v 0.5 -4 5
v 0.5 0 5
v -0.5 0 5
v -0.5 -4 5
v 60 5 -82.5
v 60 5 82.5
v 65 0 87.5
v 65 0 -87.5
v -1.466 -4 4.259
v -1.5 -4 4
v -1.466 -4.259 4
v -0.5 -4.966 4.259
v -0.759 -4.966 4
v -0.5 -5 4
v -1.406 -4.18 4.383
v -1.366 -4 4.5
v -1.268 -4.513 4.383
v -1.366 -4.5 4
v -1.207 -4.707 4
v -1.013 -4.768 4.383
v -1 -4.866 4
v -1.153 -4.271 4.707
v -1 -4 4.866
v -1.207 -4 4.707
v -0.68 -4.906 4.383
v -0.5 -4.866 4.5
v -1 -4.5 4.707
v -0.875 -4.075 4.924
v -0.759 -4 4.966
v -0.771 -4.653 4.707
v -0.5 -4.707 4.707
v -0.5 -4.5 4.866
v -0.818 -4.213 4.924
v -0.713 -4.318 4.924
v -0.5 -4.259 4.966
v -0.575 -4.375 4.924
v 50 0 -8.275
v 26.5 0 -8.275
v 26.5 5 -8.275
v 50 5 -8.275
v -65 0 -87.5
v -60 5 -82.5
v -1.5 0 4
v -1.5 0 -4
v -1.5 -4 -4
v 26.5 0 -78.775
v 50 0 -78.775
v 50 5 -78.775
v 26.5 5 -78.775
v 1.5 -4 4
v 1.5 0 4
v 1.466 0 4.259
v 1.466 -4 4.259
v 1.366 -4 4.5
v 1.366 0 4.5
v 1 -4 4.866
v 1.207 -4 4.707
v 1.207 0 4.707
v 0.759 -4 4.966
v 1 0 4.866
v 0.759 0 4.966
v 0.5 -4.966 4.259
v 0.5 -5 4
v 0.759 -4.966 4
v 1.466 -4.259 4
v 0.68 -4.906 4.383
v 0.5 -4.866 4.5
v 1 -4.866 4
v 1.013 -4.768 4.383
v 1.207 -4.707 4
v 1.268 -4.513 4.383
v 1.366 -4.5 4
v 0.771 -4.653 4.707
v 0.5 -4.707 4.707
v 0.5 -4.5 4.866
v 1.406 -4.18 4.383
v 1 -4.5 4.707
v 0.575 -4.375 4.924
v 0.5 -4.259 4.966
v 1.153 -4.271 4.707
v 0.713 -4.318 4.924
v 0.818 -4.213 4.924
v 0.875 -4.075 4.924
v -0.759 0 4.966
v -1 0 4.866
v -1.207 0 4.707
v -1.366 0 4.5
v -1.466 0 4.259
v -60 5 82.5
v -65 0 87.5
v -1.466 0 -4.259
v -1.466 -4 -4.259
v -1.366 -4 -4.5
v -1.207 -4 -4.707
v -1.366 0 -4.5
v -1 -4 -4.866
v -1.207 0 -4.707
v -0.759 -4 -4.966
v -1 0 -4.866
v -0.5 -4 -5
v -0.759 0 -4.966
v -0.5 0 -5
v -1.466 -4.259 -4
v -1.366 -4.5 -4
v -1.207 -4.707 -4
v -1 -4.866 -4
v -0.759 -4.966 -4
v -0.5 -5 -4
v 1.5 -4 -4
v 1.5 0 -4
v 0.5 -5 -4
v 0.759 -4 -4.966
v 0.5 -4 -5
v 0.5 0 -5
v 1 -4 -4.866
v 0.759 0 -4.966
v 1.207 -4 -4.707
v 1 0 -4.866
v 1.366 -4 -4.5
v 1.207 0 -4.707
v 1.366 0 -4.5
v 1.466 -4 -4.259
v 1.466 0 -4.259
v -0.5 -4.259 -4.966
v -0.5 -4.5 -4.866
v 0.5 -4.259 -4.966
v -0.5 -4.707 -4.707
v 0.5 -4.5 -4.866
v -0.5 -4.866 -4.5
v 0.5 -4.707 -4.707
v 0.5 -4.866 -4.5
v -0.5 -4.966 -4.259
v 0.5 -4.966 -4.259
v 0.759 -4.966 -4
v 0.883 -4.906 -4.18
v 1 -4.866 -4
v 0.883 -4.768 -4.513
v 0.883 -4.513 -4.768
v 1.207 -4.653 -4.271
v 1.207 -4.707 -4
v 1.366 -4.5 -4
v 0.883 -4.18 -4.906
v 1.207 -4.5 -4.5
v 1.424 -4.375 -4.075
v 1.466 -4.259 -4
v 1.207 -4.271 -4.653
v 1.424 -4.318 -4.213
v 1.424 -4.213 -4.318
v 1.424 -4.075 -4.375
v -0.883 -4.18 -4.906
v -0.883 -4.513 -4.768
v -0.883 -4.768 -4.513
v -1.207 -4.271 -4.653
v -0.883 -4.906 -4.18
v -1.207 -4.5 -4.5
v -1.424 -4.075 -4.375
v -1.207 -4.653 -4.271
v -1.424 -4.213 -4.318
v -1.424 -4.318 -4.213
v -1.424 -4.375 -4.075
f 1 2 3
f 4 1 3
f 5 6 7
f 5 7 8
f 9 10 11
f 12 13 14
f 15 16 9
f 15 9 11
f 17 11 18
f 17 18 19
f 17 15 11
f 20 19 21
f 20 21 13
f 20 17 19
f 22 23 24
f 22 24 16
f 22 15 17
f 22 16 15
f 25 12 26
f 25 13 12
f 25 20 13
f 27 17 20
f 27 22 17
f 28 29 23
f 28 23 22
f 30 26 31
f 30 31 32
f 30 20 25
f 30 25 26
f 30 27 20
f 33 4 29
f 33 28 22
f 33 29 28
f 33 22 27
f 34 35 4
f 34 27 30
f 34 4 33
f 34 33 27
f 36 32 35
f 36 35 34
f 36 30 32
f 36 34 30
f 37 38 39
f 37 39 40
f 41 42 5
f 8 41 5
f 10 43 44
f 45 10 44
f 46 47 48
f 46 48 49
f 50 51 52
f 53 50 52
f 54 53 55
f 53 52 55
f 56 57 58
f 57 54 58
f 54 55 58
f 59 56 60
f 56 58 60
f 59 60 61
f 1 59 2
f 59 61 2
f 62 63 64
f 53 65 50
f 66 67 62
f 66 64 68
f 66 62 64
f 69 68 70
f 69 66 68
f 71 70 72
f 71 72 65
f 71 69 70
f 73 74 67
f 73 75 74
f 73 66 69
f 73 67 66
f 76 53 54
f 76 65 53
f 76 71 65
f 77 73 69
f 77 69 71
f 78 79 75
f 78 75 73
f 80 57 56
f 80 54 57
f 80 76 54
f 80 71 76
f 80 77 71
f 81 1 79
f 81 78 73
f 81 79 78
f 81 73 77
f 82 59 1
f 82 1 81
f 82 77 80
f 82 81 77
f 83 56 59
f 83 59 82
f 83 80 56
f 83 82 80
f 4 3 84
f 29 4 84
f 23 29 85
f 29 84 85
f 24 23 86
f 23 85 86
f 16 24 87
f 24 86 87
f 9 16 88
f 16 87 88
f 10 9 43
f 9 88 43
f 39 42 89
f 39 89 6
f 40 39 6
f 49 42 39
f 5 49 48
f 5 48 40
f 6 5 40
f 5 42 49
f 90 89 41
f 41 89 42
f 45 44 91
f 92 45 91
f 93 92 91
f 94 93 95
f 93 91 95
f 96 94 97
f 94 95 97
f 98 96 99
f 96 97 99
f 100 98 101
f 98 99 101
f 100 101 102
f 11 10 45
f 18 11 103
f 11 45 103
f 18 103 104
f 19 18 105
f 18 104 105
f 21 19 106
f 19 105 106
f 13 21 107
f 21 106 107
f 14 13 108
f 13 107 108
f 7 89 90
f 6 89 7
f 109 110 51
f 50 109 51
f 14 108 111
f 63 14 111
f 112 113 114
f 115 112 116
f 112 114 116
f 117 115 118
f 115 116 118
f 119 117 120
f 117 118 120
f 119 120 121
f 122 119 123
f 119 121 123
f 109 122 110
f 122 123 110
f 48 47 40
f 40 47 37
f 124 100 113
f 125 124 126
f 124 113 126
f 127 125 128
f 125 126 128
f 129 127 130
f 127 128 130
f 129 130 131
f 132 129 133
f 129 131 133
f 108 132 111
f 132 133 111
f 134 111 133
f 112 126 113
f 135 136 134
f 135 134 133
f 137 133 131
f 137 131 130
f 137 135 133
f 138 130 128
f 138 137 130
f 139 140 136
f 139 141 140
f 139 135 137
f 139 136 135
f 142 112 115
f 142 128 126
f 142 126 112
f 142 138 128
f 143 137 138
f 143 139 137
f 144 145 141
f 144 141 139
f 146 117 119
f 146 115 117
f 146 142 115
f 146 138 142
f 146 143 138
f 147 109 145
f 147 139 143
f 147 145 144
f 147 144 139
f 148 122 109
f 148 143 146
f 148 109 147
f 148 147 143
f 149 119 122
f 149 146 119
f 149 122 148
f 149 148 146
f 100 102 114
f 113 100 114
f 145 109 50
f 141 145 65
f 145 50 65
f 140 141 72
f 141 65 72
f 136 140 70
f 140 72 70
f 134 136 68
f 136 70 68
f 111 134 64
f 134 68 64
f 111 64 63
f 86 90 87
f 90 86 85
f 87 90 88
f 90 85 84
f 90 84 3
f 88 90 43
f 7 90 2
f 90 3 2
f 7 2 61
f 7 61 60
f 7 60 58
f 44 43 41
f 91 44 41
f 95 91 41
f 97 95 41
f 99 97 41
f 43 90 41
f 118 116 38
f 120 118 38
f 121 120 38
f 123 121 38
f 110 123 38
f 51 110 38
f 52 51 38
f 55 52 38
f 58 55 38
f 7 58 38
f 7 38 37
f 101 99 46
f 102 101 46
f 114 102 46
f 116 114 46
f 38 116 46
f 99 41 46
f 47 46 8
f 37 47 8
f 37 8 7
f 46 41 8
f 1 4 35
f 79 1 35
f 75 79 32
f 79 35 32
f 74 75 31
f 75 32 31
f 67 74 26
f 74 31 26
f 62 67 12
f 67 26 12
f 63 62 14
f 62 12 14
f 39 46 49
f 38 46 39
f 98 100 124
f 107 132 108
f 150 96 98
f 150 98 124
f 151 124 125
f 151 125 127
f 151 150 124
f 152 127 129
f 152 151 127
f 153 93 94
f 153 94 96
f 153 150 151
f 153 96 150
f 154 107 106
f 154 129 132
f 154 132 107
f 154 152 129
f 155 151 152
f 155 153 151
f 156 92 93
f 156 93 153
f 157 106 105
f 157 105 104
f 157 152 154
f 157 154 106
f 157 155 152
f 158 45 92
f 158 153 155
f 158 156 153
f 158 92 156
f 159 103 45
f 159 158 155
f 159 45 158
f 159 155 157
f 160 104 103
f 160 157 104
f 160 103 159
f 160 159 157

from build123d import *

# Parameters (mm, degrees)
SKETCH1_W           = 130
SKETCH1_H           = 175
BOSS_EXTRUDE1_DEPTH = 5
CHAMFER1_SIZE       = 5
SKETCH2_W           = 1.5
SKETCH2_H           = 5
BOSS_EXTRUDE2_DEPTH = 5
FILLET2_R           = 1
FILLET3_R           = 1
CUT_EXTRUDE1_DEPTH  = 5


# Some blends are built 0.0001 mm under size
with BuildPart() as part:
    # Sketch1 → Boss-Extrude1 (new body)
    with BuildSketch(Plane(origin=(0, 0, 0), x_dir=(1, 0, 0), z_dir=(0, 1, 0))):
        Rectangle(SKETCH1_W, SKETCH1_H)
    extrude(amount=BOSS_EXTRUDE1_DEPTH)

    # Chamfer1
    chamfer1_edges = [part.edges().sort_by_distance(p)[0] for p in [
        (65, 5, 0),
        (0, 5, -87.5),
        (-65, 5, 0),
        (0, 5, 87.5),
    ]]
    chamfer(chamfer1_edges, length=CHAMFER1_SIZE - 0.0001)  # a hair under: the kernel refuses the full size

    # Sketch2 → Boss-Extrude2 (add)
    with BuildSketch(Plane.XZ):
        Polygon((0, 5), (0, 0), (-1.5, 0), (-1.5, -5), (1.5, -5), (1.5, 5), align=None)
        with Locations((-0.75, 2.5)):
            Rectangle(SKETCH2_W, SKETCH2_H)
    extrude(amount=BOSS_EXTRUDE2_DEPTH)

    # Fillet2
    fillet2_edges = [part.edges().sort_by_distance(p)[0] for p in [
        (-1.5, -5, 0),
        (0, -5, -5),
        (0, -5, 5),
        (1.5, -5, 0),
    ]]
    fillet(fillet2_edges, radius=FILLET2_R)

    # Fillet3
    # the kernel refuses this fillet: 1 mm, written as the material it takes off along each edge
    with BuildSketch(Plane(origin=(-0.5, -4, -4), x_dir=(0, 0, -1), z_dir=(-1, 0, 0))) as fillet3_piece_1_section:
        Polygon((0, 0), (FILLET3_R, 0), (FILLET3_R, FILLET3_R), (0, FILLET3_R), align=None)
    fillet3_piece_1 = extrude(amount=FILLET3_R, mode=Mode.PRIVATE)
    fillet3_piece_1 = fillet3_piece_1 - Plane(origin=(-0.5, -4, -4), x_dir=(0, 0.7071067811865475, 0.7071067811865475), z_dir=(-1, 0, 0)) * Sphere(FILLET3_R, mode=Mode.PRIVATE)
    add(fillet3_piece_1, mode=Mode.SUBTRACT)
    with BuildSketch(Plane(origin=(-0.5, -4, 4), x_dir=(-1, 0, 0), z_dir=(0, 0, 1))) as fillet3_piece_2_section:
        Polygon((0, 0), (FILLET3_R, 0), (FILLET3_R, FILLET3_R), (0, FILLET3_R), align=None)
    fillet3_piece_2 = extrude(amount=FILLET3_R, mode=Mode.PRIVATE)
    fillet3_piece_2 = fillet3_piece_2 - Plane(origin=(-0.5, -4, 4), x_dir=(0.7071067811865475, 0.7071067811865475, 0), z_dir=(0, 0, 1)) * Sphere(FILLET3_R, mode=Mode.PRIVATE)
    add(fillet3_piece_2, mode=Mode.SUBTRACT)
    with BuildSketch(Plane(origin=(0.5, -4, -4), x_dir=(0, 0, -1), z_dir=(1, 0, 0))) as fillet3_piece_3_section:
        Polygon((0, 0), (FILLET3_R, 0), (FILLET3_R, -FILLET3_R), (0, -FILLET3_R), align=None)
    fillet3_piece_3 = extrude(amount=FILLET3_R, mode=Mode.PRIVATE)
    fillet3_piece_3 = fillet3_piece_3 - Plane(origin=(0.5, -4, -4), x_dir=(0, 0.7071067811865475, 0.7071067811865475), z_dir=(1, 0, 0)) * Sphere(FILLET3_R, mode=Mode.PRIVATE)
    add(fillet3_piece_3, mode=Mode.SUBTRACT)
    with BuildSketch(Plane(origin=(0.5, -4, 4), x_dir=(1, 0, 0), z_dir=(0, 0, 1))) as fillet3_piece_4_section:
        Polygon((0, 0), (FILLET3_R, 0), (FILLET3_R, -FILLET3_R), (0, -FILLET3_R), align=None)
    fillet3_piece_4 = extrude(amount=FILLET3_R, mode=Mode.PRIVATE)
    fillet3_piece_4 = fillet3_piece_4 - Plane(origin=(0.5, -4, 4), x_dir=(-0.7071067811865475, 0.7071067811865475, 0), z_dir=(0, 0, 1)) * Sphere(FILLET3_R, mode=Mode.PRIVATE)
    add(fillet3_piece_4, mode=Mode.SUBTRACT)
    with BuildSketch(Plane(origin=(1.5, 0, 5), x_dir=(-1, 0, 0), z_dir=(0, -1, 0)), Plane(origin=(1.5, 0, -5), x_dir=(0, 0, 1), z_dir=(0, -1, 0))) as fillet3_piece_5:
        with BuildLine():
            CenterArc((FILLET3_R, FILLET3_R), FILLET3_R, 180, 90)
            Line((0, FILLET3_R), (0, 0))
            Line((0, 0), (FILLET3_R, 0))
        make_face()
    extrude(amount=4, mode=Mode.SUBTRACT)
    with BuildSketch(Plane(origin=(-1.5, 0, -5), x_dir=(0, 0, 1), z_dir=(0, -1, 0)), Plane(origin=(-1.5, 0, 5), x_dir=(1, 0, 0), z_dir=(0, -1, 0))) as fillet3_piece_6:
        with BuildLine():
            CenterArc((FILLET3_R, -FILLET3_R), FILLET3_R, 90, 90)
            Line((0, -FILLET3_R), (0, 0))
            Line((0, 0), (FILLET3_R, 0))
        make_face()
    extrude(amount=4, mode=Mode.SUBTRACT)

    # Sketch4 → Cut-Extrude1 (cut)
    with BuildSketch(Plane.XZ):
        Polygon((50, -78.775), (26.5, -78.775), (26.5, -8.275), (50, -8.275), (50, -43.75), align=None)
    extrude(amount=-CUT_EXTRUDE1_DEPTH, mode=Mode.SUBTRACT)


solid = part.part
